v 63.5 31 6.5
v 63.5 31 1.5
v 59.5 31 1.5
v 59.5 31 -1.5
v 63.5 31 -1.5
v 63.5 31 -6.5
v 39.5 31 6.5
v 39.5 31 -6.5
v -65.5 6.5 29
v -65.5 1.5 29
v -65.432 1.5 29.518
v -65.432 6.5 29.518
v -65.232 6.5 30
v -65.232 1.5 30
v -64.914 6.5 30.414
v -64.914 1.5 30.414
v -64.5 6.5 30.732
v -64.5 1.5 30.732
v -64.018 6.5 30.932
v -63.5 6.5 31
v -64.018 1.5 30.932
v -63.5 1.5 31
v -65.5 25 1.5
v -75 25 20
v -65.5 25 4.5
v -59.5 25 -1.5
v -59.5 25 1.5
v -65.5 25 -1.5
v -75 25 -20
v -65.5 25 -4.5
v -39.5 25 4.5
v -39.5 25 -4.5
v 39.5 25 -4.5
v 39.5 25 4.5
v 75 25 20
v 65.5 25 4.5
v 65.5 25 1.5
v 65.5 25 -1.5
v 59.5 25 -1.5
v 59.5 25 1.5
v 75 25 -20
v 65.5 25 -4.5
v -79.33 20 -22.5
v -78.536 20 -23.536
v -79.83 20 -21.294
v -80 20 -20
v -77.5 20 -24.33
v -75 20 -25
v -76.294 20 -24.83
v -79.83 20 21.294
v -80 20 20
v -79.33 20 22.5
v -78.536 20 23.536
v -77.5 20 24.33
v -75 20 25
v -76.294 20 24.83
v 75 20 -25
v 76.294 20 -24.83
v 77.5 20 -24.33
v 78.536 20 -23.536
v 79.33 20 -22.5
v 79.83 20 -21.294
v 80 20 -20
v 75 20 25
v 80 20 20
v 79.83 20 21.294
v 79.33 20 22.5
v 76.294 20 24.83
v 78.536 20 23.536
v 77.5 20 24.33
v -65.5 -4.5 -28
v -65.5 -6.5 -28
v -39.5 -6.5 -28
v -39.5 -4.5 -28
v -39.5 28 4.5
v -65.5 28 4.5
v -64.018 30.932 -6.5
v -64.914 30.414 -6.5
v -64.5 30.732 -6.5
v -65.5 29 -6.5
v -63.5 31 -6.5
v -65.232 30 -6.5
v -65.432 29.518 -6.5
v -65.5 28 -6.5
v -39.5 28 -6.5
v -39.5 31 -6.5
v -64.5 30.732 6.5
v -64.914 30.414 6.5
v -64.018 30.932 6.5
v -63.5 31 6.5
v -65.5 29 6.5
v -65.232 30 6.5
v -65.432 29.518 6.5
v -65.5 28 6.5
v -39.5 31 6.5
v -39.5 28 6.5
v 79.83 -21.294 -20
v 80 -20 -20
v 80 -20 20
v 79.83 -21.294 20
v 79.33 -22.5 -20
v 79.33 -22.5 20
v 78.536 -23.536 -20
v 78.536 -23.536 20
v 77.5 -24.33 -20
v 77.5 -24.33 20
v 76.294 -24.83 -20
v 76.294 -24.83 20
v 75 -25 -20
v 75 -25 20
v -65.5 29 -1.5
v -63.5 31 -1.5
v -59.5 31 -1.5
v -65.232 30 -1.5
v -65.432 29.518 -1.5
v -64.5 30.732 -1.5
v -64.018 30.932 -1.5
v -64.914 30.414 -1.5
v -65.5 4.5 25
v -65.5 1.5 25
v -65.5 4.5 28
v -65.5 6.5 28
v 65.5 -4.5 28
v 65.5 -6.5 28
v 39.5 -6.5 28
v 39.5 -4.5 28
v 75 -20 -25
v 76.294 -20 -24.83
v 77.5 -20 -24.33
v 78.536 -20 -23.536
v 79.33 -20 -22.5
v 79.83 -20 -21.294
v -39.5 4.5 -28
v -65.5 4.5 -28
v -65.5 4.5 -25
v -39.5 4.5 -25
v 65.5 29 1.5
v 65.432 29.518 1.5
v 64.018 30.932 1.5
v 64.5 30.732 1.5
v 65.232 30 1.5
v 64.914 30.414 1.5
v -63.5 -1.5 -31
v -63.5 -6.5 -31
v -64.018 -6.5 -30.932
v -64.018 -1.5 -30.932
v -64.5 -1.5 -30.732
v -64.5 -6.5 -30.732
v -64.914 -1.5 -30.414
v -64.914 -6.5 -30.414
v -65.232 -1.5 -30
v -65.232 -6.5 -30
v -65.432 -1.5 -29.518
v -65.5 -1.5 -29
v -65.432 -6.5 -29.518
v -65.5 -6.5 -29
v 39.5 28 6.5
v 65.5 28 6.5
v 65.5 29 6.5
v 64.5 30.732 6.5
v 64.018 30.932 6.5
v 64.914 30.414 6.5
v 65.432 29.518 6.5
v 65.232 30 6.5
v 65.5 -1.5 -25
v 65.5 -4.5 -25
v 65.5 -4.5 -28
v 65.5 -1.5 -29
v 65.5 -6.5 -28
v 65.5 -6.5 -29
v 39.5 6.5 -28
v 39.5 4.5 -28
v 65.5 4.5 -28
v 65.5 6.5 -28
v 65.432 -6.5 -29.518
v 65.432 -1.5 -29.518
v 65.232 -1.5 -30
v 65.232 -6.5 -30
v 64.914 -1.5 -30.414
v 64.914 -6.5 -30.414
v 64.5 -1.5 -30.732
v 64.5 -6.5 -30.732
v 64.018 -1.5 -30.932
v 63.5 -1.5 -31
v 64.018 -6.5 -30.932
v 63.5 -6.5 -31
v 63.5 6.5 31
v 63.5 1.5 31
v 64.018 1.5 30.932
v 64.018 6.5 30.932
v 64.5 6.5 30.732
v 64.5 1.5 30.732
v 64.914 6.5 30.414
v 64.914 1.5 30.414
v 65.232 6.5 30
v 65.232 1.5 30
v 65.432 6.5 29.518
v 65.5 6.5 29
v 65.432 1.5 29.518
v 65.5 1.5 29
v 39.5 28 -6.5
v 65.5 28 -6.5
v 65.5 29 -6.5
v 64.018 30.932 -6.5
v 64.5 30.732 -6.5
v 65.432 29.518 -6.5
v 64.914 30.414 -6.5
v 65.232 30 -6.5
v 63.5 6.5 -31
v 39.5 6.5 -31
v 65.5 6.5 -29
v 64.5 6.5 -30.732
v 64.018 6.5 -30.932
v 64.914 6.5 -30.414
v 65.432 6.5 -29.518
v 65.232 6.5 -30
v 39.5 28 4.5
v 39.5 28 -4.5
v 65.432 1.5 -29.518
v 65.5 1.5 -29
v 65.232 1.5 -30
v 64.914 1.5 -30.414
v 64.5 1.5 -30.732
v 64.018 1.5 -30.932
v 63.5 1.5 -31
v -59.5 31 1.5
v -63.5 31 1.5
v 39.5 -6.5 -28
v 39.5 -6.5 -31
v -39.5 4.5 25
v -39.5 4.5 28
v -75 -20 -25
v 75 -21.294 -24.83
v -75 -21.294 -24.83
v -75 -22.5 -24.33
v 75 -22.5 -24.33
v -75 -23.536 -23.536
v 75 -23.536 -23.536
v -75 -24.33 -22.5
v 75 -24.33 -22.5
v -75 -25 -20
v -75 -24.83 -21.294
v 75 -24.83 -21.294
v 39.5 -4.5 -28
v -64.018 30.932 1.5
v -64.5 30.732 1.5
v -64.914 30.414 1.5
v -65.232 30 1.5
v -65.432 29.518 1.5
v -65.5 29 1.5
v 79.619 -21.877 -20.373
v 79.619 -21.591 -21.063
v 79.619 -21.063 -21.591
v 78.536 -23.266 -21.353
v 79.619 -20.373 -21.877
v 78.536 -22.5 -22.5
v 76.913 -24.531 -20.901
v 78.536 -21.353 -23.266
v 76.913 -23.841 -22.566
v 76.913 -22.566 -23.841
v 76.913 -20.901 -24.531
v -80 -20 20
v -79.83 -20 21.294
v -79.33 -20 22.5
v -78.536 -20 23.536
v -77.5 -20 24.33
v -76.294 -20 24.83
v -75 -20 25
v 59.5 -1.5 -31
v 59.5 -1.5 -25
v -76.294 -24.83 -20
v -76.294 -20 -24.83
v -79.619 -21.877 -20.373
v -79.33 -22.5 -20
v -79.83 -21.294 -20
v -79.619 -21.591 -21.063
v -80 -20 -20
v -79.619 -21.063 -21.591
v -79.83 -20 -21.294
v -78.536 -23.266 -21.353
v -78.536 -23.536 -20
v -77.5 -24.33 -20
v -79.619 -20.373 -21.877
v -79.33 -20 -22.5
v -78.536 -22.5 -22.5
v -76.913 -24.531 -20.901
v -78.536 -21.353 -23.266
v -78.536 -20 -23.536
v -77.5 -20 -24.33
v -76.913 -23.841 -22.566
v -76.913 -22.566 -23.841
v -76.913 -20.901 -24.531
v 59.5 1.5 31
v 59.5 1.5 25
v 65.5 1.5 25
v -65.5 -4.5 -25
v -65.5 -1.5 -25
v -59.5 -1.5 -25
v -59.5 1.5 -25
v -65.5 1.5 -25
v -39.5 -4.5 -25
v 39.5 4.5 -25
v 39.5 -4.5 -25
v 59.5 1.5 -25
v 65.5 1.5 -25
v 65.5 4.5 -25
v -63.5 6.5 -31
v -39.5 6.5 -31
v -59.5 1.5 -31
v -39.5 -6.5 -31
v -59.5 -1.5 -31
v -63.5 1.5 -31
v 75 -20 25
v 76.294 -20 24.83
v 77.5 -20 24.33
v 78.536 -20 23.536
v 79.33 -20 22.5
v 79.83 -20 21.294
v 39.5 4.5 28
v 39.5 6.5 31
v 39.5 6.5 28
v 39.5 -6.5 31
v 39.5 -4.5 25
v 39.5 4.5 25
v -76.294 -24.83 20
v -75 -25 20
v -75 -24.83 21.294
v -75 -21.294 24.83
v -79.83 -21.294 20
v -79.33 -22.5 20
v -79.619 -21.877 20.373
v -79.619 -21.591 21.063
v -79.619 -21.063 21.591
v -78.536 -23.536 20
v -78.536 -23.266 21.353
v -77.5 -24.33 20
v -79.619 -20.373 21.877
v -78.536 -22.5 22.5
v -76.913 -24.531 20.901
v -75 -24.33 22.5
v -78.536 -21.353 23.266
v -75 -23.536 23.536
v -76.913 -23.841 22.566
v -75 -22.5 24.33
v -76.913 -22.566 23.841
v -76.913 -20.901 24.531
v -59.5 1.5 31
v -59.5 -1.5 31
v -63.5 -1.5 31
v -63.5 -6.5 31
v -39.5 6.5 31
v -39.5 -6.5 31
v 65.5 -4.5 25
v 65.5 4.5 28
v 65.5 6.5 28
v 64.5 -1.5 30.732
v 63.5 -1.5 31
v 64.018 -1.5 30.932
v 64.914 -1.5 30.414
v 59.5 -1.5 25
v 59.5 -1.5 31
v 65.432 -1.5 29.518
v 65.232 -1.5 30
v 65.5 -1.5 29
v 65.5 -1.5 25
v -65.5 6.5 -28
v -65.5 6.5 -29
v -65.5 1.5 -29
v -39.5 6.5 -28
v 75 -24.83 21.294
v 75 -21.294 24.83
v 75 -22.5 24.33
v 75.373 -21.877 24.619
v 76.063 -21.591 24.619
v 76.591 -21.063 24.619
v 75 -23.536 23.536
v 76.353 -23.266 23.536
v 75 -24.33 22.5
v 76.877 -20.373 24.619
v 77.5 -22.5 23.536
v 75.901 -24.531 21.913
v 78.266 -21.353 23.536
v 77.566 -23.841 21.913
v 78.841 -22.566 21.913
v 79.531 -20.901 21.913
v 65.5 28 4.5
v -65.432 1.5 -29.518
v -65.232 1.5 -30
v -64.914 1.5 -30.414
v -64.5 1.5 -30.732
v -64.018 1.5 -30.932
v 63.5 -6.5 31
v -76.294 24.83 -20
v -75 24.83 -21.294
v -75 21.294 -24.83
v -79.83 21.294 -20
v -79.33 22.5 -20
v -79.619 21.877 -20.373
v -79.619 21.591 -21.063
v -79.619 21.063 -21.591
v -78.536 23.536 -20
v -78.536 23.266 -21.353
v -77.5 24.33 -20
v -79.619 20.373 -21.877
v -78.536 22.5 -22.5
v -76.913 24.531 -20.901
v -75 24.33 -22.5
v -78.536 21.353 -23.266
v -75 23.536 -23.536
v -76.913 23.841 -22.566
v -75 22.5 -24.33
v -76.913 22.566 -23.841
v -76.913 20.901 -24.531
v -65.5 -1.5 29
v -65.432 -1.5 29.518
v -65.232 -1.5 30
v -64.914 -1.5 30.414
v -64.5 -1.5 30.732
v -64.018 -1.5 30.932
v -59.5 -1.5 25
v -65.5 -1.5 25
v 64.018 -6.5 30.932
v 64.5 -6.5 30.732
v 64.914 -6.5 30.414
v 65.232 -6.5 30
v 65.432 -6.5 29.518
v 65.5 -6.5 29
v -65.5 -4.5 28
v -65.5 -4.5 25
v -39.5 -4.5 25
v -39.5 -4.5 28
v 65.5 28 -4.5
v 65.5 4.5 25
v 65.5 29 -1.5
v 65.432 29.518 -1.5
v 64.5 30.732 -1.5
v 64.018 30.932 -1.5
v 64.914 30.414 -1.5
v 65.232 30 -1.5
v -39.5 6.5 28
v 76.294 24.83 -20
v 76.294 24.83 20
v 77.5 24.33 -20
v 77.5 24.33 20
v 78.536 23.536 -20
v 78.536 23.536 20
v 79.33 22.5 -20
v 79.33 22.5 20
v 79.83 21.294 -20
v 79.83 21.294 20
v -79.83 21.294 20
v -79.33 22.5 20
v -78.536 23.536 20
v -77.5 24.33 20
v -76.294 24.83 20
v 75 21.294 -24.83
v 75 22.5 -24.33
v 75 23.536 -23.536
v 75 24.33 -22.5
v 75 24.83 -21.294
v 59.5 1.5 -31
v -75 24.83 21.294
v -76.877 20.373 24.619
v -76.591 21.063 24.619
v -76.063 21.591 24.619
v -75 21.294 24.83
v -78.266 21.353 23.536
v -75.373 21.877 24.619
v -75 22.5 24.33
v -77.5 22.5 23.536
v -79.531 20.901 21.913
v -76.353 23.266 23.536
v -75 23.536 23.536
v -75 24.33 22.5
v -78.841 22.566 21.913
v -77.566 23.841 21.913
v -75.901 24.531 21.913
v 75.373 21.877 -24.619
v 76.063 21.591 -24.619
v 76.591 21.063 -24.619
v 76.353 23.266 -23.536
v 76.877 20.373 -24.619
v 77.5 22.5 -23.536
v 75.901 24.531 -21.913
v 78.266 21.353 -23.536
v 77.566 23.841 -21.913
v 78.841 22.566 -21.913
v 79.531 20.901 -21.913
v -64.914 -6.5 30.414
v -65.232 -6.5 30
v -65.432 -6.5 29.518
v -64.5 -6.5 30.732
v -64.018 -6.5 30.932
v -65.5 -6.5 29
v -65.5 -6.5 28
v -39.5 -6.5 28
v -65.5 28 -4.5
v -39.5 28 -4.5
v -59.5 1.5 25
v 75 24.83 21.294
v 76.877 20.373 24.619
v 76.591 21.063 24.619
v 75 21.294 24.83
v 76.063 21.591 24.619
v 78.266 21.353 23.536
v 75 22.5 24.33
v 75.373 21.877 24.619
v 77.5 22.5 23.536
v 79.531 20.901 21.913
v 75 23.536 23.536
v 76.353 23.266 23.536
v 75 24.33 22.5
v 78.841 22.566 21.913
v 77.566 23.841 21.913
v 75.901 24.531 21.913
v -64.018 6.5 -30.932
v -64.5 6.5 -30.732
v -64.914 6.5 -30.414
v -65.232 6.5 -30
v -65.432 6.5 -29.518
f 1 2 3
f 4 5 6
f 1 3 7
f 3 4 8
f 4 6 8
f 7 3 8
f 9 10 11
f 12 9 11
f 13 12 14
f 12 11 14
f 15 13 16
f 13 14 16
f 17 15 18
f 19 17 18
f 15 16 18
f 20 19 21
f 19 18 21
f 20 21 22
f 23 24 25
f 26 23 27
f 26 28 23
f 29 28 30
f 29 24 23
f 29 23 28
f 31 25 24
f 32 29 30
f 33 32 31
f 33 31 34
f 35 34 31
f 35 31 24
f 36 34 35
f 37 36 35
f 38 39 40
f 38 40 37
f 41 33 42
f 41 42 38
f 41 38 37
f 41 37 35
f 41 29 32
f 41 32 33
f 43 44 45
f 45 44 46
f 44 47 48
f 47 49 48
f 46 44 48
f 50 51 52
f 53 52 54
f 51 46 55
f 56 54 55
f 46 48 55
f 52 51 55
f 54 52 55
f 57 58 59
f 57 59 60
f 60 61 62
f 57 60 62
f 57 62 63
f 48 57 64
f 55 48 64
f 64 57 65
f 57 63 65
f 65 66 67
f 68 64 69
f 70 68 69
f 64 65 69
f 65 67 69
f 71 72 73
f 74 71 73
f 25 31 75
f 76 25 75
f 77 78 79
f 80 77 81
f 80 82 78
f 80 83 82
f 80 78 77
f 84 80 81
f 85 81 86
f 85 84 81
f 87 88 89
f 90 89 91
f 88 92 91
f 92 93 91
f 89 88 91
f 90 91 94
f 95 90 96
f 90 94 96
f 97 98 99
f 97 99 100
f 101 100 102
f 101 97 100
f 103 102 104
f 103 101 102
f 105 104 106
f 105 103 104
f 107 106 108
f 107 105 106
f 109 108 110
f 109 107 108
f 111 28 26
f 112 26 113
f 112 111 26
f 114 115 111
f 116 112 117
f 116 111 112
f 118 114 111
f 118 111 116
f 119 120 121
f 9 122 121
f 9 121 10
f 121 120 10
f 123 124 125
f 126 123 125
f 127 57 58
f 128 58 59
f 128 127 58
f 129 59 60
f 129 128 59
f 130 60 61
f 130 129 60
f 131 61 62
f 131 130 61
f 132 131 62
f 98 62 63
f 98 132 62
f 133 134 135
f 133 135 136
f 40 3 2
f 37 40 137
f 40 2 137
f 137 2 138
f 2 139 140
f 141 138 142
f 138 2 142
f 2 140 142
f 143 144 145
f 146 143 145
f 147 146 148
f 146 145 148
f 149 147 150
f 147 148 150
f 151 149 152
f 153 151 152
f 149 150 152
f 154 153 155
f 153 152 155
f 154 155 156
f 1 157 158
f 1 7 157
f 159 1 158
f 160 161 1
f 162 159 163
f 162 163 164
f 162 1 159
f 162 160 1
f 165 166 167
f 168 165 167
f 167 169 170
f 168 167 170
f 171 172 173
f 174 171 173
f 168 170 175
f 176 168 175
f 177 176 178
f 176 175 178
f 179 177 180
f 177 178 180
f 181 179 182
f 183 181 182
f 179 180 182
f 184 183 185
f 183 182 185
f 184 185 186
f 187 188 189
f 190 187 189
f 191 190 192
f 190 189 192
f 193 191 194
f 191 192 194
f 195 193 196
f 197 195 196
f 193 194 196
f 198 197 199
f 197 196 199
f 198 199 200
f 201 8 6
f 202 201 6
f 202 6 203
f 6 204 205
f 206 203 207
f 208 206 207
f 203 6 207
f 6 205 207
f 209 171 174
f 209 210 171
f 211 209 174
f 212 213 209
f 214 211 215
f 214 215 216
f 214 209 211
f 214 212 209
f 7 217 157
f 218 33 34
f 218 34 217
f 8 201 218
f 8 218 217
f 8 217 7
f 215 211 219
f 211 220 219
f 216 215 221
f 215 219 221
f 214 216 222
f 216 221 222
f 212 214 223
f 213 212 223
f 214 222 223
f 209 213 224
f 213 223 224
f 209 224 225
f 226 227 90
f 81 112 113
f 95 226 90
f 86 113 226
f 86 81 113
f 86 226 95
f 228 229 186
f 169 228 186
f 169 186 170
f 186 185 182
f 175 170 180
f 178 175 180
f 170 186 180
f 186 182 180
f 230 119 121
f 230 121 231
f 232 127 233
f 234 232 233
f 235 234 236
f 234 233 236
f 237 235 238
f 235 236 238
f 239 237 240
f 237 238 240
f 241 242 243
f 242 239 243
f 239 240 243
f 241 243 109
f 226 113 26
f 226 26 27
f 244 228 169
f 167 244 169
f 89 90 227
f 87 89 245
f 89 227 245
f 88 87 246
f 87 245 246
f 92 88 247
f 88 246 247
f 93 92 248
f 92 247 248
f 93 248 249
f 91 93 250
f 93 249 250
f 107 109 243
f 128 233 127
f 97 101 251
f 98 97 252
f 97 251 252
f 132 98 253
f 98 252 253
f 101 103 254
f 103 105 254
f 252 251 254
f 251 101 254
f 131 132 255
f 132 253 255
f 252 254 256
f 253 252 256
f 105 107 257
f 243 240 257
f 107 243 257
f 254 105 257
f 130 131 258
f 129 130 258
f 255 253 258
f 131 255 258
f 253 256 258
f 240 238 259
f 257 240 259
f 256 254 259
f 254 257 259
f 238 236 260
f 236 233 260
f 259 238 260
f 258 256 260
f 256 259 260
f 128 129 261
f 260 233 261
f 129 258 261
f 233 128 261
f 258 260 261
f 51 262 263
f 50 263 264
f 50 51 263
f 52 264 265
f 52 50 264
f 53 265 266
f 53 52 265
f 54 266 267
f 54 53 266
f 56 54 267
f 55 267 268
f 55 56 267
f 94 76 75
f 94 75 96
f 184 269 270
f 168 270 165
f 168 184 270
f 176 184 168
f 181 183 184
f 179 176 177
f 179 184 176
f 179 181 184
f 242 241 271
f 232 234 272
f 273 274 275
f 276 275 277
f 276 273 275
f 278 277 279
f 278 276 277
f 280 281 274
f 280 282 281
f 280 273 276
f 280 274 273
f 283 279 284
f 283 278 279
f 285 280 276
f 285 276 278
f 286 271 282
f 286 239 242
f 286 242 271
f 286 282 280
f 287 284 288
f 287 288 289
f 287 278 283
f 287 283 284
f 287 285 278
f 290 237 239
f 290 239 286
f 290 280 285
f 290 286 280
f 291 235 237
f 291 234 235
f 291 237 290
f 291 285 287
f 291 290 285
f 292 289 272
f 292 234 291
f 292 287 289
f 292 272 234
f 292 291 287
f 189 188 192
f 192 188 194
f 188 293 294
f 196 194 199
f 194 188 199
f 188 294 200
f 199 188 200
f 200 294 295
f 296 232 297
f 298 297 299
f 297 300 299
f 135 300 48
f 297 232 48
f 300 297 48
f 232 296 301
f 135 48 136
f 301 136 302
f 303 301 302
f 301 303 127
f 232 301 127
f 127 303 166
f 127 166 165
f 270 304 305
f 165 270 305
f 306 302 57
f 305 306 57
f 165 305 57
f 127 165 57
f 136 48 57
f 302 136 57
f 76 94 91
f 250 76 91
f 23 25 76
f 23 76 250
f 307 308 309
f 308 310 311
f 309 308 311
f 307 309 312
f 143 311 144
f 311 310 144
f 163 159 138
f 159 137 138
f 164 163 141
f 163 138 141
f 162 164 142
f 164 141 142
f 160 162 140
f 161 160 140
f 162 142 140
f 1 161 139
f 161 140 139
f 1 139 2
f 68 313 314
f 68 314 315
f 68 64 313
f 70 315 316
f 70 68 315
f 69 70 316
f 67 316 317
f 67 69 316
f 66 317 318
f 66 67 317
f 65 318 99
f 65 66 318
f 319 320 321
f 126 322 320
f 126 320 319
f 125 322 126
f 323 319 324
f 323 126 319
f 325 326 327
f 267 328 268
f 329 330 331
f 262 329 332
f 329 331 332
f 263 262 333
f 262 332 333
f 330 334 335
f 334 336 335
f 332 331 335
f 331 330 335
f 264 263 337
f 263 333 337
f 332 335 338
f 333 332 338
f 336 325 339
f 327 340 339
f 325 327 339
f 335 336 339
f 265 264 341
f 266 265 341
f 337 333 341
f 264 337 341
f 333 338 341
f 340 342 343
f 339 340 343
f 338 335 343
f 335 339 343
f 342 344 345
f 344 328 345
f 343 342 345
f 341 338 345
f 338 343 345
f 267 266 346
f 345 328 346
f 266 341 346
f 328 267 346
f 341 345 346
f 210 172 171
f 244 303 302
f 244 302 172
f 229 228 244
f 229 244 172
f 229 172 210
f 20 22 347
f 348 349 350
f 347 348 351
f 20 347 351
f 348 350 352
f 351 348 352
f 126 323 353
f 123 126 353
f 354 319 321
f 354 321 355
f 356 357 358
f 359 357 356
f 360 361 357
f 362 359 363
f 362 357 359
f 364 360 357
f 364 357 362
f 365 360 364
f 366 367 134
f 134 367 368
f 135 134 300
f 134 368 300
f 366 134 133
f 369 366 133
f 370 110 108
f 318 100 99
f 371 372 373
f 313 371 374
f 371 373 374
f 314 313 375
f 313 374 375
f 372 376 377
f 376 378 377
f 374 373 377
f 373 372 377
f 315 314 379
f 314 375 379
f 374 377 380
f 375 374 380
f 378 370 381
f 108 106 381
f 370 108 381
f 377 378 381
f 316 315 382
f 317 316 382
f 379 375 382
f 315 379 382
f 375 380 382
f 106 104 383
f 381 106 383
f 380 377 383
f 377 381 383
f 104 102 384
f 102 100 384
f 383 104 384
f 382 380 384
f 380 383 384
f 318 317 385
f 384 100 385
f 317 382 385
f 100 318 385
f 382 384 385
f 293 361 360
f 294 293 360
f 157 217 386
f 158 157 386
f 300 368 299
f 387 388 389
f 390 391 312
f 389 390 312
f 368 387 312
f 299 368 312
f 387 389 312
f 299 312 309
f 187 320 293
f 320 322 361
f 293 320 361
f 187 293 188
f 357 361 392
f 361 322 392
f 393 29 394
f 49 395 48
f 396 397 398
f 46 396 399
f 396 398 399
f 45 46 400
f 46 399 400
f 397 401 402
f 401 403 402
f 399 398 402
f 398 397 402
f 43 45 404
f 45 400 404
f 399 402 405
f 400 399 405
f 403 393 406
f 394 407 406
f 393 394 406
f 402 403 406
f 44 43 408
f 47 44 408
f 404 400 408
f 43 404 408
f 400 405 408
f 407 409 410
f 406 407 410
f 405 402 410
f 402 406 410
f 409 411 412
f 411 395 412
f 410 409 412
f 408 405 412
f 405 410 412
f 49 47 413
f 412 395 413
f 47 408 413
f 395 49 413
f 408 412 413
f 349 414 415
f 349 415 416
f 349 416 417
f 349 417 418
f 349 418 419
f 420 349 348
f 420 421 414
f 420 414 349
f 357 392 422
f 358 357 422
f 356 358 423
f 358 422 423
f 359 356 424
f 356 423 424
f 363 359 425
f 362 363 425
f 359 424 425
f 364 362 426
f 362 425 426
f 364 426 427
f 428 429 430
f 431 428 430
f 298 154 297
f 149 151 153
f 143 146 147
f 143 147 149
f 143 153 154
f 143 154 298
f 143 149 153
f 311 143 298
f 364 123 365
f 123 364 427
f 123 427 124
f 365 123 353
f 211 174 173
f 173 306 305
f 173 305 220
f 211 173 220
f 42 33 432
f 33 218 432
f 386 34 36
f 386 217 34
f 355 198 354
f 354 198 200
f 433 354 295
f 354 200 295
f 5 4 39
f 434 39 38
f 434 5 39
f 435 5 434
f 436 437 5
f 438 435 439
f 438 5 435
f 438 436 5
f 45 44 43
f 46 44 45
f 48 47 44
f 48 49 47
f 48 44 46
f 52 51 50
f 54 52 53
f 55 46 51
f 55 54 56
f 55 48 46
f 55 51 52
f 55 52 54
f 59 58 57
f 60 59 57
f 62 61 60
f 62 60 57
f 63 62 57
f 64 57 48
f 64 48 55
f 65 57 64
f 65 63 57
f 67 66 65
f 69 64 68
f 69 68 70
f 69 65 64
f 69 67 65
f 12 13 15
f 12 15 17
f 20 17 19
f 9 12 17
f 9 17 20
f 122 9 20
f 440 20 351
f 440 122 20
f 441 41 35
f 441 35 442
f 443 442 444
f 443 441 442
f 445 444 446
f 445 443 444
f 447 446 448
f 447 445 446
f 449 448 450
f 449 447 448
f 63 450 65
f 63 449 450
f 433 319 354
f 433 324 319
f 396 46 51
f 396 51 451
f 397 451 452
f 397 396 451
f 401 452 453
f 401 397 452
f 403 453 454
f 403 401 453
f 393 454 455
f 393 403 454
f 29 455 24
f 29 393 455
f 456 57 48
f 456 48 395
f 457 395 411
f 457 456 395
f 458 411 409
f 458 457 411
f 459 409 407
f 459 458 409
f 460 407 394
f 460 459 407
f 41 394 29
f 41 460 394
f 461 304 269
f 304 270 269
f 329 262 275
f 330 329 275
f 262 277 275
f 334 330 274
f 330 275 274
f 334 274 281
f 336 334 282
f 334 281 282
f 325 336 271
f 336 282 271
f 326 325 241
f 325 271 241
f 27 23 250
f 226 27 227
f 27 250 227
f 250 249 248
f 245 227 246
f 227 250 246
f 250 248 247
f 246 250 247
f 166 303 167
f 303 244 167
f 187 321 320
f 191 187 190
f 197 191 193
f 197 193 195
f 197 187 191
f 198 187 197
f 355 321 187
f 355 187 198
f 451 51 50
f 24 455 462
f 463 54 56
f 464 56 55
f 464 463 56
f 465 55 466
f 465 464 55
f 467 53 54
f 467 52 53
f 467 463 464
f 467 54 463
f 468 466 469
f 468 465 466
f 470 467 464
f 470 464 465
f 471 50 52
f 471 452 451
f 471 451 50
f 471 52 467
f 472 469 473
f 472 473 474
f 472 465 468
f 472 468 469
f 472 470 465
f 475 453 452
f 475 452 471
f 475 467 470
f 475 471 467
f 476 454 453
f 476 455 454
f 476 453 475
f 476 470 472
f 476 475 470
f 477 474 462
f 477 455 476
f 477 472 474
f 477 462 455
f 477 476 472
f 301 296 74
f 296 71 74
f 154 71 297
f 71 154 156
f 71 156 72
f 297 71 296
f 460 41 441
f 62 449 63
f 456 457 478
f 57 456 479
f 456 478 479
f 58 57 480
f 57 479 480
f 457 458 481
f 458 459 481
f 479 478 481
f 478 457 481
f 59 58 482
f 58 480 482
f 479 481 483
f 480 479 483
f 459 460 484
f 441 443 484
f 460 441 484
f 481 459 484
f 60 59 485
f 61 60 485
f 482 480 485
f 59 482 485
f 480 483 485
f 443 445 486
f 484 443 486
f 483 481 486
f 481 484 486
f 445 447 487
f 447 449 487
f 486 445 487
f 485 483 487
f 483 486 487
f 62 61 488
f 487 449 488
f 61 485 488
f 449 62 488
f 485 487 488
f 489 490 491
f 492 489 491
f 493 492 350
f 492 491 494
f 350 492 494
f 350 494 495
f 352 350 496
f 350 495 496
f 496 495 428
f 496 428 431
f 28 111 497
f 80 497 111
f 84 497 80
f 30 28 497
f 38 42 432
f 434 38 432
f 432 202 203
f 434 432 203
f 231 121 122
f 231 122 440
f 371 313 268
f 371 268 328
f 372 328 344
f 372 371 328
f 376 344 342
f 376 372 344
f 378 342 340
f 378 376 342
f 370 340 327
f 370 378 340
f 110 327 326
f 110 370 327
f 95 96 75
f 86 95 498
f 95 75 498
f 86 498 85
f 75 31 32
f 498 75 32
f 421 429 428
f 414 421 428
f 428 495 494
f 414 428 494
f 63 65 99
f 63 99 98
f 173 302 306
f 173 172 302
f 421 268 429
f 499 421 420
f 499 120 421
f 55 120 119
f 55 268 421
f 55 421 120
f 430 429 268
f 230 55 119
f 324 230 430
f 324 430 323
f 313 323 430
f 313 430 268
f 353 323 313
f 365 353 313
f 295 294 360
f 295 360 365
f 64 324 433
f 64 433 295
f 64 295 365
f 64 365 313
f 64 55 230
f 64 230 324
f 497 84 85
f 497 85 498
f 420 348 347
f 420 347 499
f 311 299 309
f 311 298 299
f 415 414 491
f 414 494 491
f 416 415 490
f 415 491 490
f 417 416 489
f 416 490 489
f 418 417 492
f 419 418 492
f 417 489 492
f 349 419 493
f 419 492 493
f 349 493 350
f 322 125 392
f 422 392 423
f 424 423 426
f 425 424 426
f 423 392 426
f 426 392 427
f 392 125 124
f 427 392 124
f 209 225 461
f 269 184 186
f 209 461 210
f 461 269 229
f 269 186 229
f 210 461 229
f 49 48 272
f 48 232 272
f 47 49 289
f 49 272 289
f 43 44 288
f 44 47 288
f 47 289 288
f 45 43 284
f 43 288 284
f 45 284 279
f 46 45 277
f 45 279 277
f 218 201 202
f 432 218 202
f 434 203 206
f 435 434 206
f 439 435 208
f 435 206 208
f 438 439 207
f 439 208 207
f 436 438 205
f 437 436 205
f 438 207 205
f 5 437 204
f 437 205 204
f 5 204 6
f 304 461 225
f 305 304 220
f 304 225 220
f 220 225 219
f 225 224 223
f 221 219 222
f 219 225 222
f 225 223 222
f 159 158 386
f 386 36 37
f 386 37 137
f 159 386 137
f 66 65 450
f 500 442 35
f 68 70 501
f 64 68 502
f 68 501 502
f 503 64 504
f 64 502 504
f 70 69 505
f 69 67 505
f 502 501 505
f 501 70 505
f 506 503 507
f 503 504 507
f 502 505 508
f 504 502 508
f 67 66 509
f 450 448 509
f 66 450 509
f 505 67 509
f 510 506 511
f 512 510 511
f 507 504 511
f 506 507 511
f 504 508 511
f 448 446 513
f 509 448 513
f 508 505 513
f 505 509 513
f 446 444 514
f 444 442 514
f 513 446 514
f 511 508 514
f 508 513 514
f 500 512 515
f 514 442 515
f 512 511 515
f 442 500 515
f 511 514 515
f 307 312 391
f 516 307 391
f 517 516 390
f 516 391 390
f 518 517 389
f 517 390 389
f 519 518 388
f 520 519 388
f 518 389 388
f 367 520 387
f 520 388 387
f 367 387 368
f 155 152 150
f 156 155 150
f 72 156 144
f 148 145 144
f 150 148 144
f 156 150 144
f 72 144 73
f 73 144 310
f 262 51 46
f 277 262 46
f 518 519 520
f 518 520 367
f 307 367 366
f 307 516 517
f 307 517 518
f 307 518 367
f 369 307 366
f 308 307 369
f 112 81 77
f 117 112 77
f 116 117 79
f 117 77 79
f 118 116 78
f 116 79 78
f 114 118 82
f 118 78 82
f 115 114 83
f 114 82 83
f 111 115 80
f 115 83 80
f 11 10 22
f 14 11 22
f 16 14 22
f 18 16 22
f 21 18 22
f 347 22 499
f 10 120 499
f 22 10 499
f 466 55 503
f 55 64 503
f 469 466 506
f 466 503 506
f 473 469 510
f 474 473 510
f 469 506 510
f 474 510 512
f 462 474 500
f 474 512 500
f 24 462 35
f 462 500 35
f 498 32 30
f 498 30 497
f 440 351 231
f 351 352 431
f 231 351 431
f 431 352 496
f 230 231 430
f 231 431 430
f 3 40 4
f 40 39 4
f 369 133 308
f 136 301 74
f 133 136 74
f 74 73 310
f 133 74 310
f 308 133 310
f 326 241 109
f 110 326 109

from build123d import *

# Parameters (mm, degrees)
SKETCH1_W               = 160
SKETCH1_H               = 50
BOSS_EXTRUDE1_DEPTH     = 25
SKETCH2_W               = 26
SKETCH2_H               = 13
CONNECTOR_BASE_DEPTH    = 6
SKETCH3_W               = 2
SKETCH3_H               = 3
DOVETAIL_CUT_DEPTH      = 151.851748415
FILLET1_R               = 2
SKETCH4_W               = 3
SKETCH4_H               = 6
CUT_EXTRUDE1_DEPTH      = 6
CIRPATTERN1_START       = -4.5
CIRPATTERN1_OUTLINE_W   = 20
CIRPATTERN1_OUTLINE_H   = 6
CIRPATTERN1_DEPTH       = 9
CIRPATTERN1_START_2     = -6.5
CIRPATTERN1_2_OUTLINE_W = 20
CIRPATTERN1_2_OUTLINE_H = 3
CIRPATTERN1_2_DEPTH     = 13
CIRPATTERN1_3_DEPTH     = 3
CIRPATTERN1_START_3     = 1.5
CIRPATTERN1_4_DEPTH     = 3
CIRPATTERN1_5_DEPTH     = 2
CIRPATTERN1_START_4     = 4.5
CIRPATTERN1_6_DEPTH     = 2
CIRPATTERN1_7_OUTLINE_W = 20
CIRPATTERN1_7_OUTLINE_H = 6
CIRPATTERN1_7_DEPTH     = 9
CIRPATTERN1_8_OUTLINE_W = 20
CIRPATTERN1_8_OUTLINE_H = 3
CIRPATTERN1_8_DEPTH     = 13
CIRPATTERN1_9_DEPTH     = 3
CIRPATTERN1_10_DEPTH    = 3
CIRPATTERN1_11_DEPTH    = 2
CIRPATTERN1_12_DEPTH    = 2
MIRROR1_START           = -4.5
MIRROR1_OUTLINE_W       = 20
MIRROR1_OUTLINE_H       = 6
MIRROR1_DEPTH           = 9
MIRROR1_START_2         = -6.5
MIRROR1_2_OUTLINE_W     = 20
MIRROR1_2_OUTLINE_H     = 3
MIRROR1_2_DEPTH         = 13
MIRROR1_3_DEPTH         = 3
MIRROR1_START_3         = 1.5
MIRROR1_4_DEPTH         = 3
MIRROR1_5_DEPTH         = 2
MIRROR1_START_4         = 4.5
MIRROR1_6_DEPTH         = 2
MIRROR1_7_OUTLINE_W     = 20
MIRROR1_7_OUTLINE_H     = 6
MIRROR1_7_DEPTH         = 9
MIRROR1_8_OUTLINE_W     = 20
MIRROR1_8_OUTLINE_H     = 3
MIRROR1_8_DEPTH         = 13
MIRROR1_9_DEPTH         = 3
MIRROR1_10_DEPTH        = 3
MIRROR1_11_DEPTH        = 2
MIRROR1_12_DEPTH        = 2
FILLET2_R               = 5
SKETCH5_W               = 150
SKETCH5_H               = 40
CUT_EXTRUDE2_DEPTH      = 6


# Read off the part's stored shape, not the designer's step: CirPattern1, Mirror1
with BuildPart() as part:
    # Sketch1 → Boss-Extrude1 (new, symmetric)
    with BuildSketch(Plane(origin=(0, 0, 0), x_dir=(1, 0, 0), z_dir=(0, 1, 0))):
        Rectangle(SKETCH1_W, SKETCH1_H)
    extrude(amount=BOSS_EXTRUDE1_DEPTH, both=True)

    # Sketch2 → connector base (add)
    with BuildSketch(Plane(origin=(0, 25, 0), x_dir=(1, 0, 0), z_dir=(0, 1, 0))):
        with Locations((-52.5, 0)):
            Rectangle(SKETCH2_W, SKETCH2_H)
    extrude(amount=CONNECTOR_BASE_DEPTH)

    # Sketch3 → dovetail cut (cut, through all)
    with BuildSketch(Plane.ZY.offset(65.5)):
        with Locations((5.5, 26.5)):
            Rectangle(SKETCH3_W, SKETCH3_H)
        with Locations((-5.5, 26.5)):
            Rectangle(SKETCH3_W, SKETCH3_H)
    extrude(amount=-DOVETAIL_CUT_DEPTH, mode=Mode.SUBTRACT)

    # Fillet1
    fillet1_edges = [part.edges().sort_by_distance(p)[0] for p in [
        (-65.5, 31, 0),
    ]]
    fillet(fillet1_edges, radius=FILLET1_R)

    # Sketch4 → Cut-Extrude1 (cut)
    with BuildSketch(Plane.ZY.offset(65.5)):
        with Locations((0, 28)):
            Rectangle(SKETCH4_W, SKETCH4_H)
    extrude(amount=-CUT_EXTRUDE1_DEPTH, mode=Mode.SUBTRACT)

    # CirPattern1 outline → CirPattern1 (add)
    with BuildSketch(Plane(origin=(0, 0, 0), x_dir=(1, 0, 0), z_dir=(0, 1, 0)).offset(CIRPATTERN1_START)):
        with Locations((-49.5, 28)):
            Rectangle(CIRPATTERN1_OUTLINE_W, CIRPATTERN1_OUTLINE_H)
        with Locations((-49.5, -28)):
            Rectangle(CIRPATTERN1_OUTLINE_W, CIRPATTERN1_OUTLINE_H)
    extrude(amount=CIRPATTERN1_DEPTH)

    # CirPattern1 2 outline → CirPattern1 2 (add)
    with BuildSketch(Plane(origin=(0, 0, 0), x_dir=(1, 0, 0), z_dir=(0, 1, 0)).offset(CIRPATTERN1_START_2)):
        with Locations((-49.5, 29.5)):
            Rectangle(CIRPATTERN1_2_OUTLINE_W, CIRPATTERN1_2_OUTLINE_H)
        with Locations((-49.5, -29.5)):
            Rectangle(CIRPATTERN1_2_OUTLINE_W, CIRPATTERN1_2_OUTLINE_H)
    extrude(amount=CIRPATTERN1_2_DEPTH)

    # CirPattern1 3 outline → CirPattern1 3 (add)
    with BuildSketch(Plane(origin=(0, 0, 0), x_dir=(1, 0, 0), z_dir=(0, 1, 0)).offset(CIRPATTERN1_START)):
        with BuildLine():
            Line((-65.5, 25), (-59.5, 25))
            Line((-59.5, 25), (-59.5, 31))
            Line((-59.5, 31), (-63.5, 31))
            ThreePointArc((-63.5, 31), (-64.914213562, 30.414213562), (-65.5, 29))
            Line((-65.5, 29), (-65.5, 25))
        make_face()
        with BuildLine():
            ThreePointArc((-65.5, -29), (-64.914213562, -30.414213562), (-63.5, -31))
            Line((-63.5, -31), (-59.5, -31))
            Line((-59.5, -31), (-59.5, -25))
            Line((-59.5, -25), (-65.5, -25))
            Line((-65.5, -25), (-65.5, -29))
        make_face()
    extrude(amount=CIRPATTERN1_3_DEPTH)

    # CirPattern1 4 outline → CirPattern1 4 (add)
    with BuildSketch(Plane(origin=(0, 0, 0), x_dir=(1, 0, 0), z_dir=(0, 1, 0)).offset(CIRPATTERN1_START_3)):
        with BuildLine():
            Line((-65.5, 25), (-59.5, 25))
            Line((-59.5, 25), (-59.5, 31))
            Line((-59.5, 31), (-63.5, 31))
            ThreePointArc((-63.5, 31), (-64.914213562, 30.414213562), (-65.5, 29))
            Line((-65.5, 29), (-65.5, 25))
        make_face()
        with BuildLine():
            ThreePointArc((-65.5, -29), (-64.914213562, -30.414213562), (-63.5, -31))
            Line((-63.5, -31), (-59.5, -31))
            Line((-59.5, -31), (-59.5, -25))
            Line((-59.5, -25), (-65.5, -25))
            Line((-65.5, -25), (-65.5, -29))
        make_face()
    extrude(amount=CIRPATTERN1_4_DEPTH)

    # CirPattern1 5 outline → CirPattern1 5 (add)
    with BuildSketch(Plane(origin=(0, 0, 0), x_dir=(1, 0, 0), z_dir=(0, 1, 0)).offset(CIRPATTERN1_START_2)):
        with BuildLine():
            Line((-65.5, 29), (-65.5, 28))
            Line((-65.5, 28), (-59.5, 28))
            Line((-59.5, 28), (-59.5, 31))
            Line((-59.5, 31), (-63.5, 31))
            ThreePointArc((-63.5, 31), (-64.914213562, 30.414213562), (-65.5, 29))
        make_face()
        with BuildLine():
            Line((-65.5, -28), (-65.5, -29))
            ThreePointArc((-65.5, -29), (-64.914213562, -30.414213562), (-63.5, -31))
            Line((-63.5, -31), (-59.5, -31))
            Line((-59.5, -31), (-59.5, -28))
            Line((-59.5, -28), (-65.5, -28))
        make_face()
    extrude(amount=CIRPATTERN1_5_DEPTH)

    # CirPattern1 6 outline → CirPattern1 6 (add)
    with BuildSketch(Plane(origin=(0, 0, 0), x_dir=(1, 0, 0), z_dir=(0, 1, 0)).offset(CIRPATTERN1_START_4)):
        with BuildLine():
            Line((-65.5, 29), (-65.5, 28))
            Line((-65.5, 28), (-59.5, 28))
            Line((-59.5, 28), (-59.5, 31))
            Line((-59.5, 31), (-63.5, 31))
            ThreePointArc((-63.5, 31), (-64.914213562, 30.414213562), (-65.5, 29))
        make_face()
        with BuildLine():
            Line((-65.5, -28), (-65.5, -29))
            ThreePointArc((-65.5, -29), (-64.914213562, -30.414213562), (-63.5, -31))
            Line((-63.5, -31), (-59.5, -31))
            Line((-59.5, -31), (-59.5, -28))
            Line((-59.5, -28), (-65.5, -28))
        make_face()
    extrude(amount=CIRPATTERN1_6_DEPTH)

    # CirPattern1 7 outline → CirPattern1 7 (add)
    with BuildSketch(Plane.XY.offset(CIRPATTERN1_START)):
        with Locations((-49.5, -28)):
            Rectangle(CIRPATTERN1_7_OUTLINE_W, CIRPATTERN1_7_OUTLINE_H)
    extrude(amount=CIRPATTERN1_7_DEPTH)

    # CirPattern1 8 outline → CirPattern1 8 (add)
    with BuildSketch(Plane.XY.offset(CIRPATTERN1_START_2)):
        with Locations((-49.5, -29.5)):
            Rectangle(CIRPATTERN1_8_OUTLINE_W, CIRPATTERN1_8_OUTLINE_H)
    extrude(amount=CIRPATTERN1_8_DEPTH)

    # CirPattern1 9 outline → CirPattern1 9 (add)
    with BuildSketch(Plane.XY.offset(CIRPATTERN1_START)):
        with BuildLine():
            ThreePointArc((-65.5, -29), (-64.914213562, -30.414213562), (-63.5, -31))
            Line((-63.5, -31), (-59.5, -31))
            Line((-59.5, -31), (-59.5, -25))
            Line((-59.5, -25), (-65.5, -25))
            Line((-65.5, -25), (-65.5, -29))
        make_face()
    extrude(amount=CIRPATTERN1_9_DEPTH)

    # CirPattern1 10 outline → CirPattern1 10 (add)
    with BuildSketch(Plane.XY.offset(CIRPATTERN1_START_3)):
        with BuildLine():
            ThreePointArc((-65.5, -29), (-64.914213562, -30.414213562), (-63.5, -31))
            Line((-63.5, -31), (-59.5, -31))
            Line((-59.5, -31), (-59.5, -25))
            Line((-59.5, -25), (-65.5, -25))
            Line((-65.5, -25), (-65.5, -29))
        make_face()
    extrude(amount=CIRPATTERN1_10_DEPTH)

    # CirPattern1 11 outline → CirPattern1 11 (add)
    with BuildSketch(Plane.XY.offset(CIRPATTERN1_START_2)):
        with BuildLine():
            Line((-65.5, -28), (-65.5, -29))
            ThreePointArc((-65.5, -29), (-64.914213562, -30.414213562), (-63.5, -31))
            Line((-63.5, -31), (-59.5, -31))
            Line((-59.5, -31), (-59.5, -28))
            Line((-59.5, -28), (-65.5, -28))
        make_face()
    extrude(amount=CIRPATTERN1_11_DEPTH)

    # CirPattern1 12 outline → CirPattern1 12 (add)
    with BuildSketch(Plane.XY.offset(CIRPATTERN1_START_4)):
        with BuildLine():
            Line((-65.5, -28), (-65.5, -29))
            ThreePointArc((-65.5, -29), (-64.914213562, -30.414213562), (-63.5, -31))
            Line((-63.5, -31), (-59.5, -31))
            Line((-59.5, -31), (-59.5, -28))
            Line((-59.5, -28), (-65.5, -28))
        make_face()
    extrude(amount=CIRPATTERN1_12_DEPTH)

    # Mirror1 outline → Mirror1 (add)
    with BuildSketch(Plane.XY.offset(MIRROR1_START)):
        with Locations((49.5, 28)):
            Rectangle(MIRROR1_OUTLINE_W, MIRROR1_OUTLINE_H)
        with Locations((49.5, -28)):
            Rectangle(MIRROR1_OUTLINE_W, MIRROR1_OUTLINE_H)
    extrude(amount=MIRROR1_DEPTH)

    # Mirror1 2 outline → Mirror1 2 (add)
    with BuildSketch(Plane.XY.offset(MIRROR1_START_2)):
        with Locations((49.5, 29.5)):
            Rectangle(MIRROR1_2_OUTLINE_W, MIRROR1_2_OUTLINE_H)
        with Locations((49.5, -29.5)):
            Rectangle(MIRROR1_2_OUTLINE_W, MIRROR1_2_OUTLINE_H)
    extrude(amount=MIRROR1_2_DEPTH)

    # Mirror1 3 outline → Mirror1 3 (add)
    with BuildSketch(Plane.XY.offset(MIRROR1_START)):
        with BuildLine():
            Line((59.5, 25), (65.5, 25))
            Line((65.5, 25), (65.5, 29))
            ThreePointArc((65.5, 29), (64.914213562, 30.414213562), (63.5, 31))
            Line((63.5, 31), (59.5, 31))
            Line((59.5, 31), (59.5, 25))
        make_face()
        with BuildLine():
            ThreePointArc((63.5, -31), (64.914213562, -30.414213562), (65.5, -29))
            Line((65.5, -29), (65.5, -25))
            Line((65.5, -25), (59.5, -25))
            Line((59.5, -25), (59.5, -31))
            Line((59.5, -31), (63.5, -31))
        make_face()
    extrude(amount=MIRROR1_3_DEPTH)

    # Mirror1 4 outline → Mirror1 4 (add)
    with BuildSketch(Plane.XY.offset(MIRROR1_START_3)):
        with BuildLine():
            Line((59.5, 25), (65.5, 25))
            Line((65.5, 25), (65.5, 29))
            ThreePointArc((65.5, 29), (64.914213562, 30.414213562), (63.5, 31))
            Line((63.5, 31), (59.5, 31))
            Line((59.5, 31), (59.5, 25))
        make_face()
        with BuildLine():
            ThreePointArc((63.5, -31), (64.914213562, -30.414213562), (65.5, -29))
            Line((65.5, -29), (65.5, -25))
            Line((65.5, -25), (59.5, -25))
            Line((59.5, -25), (59.5, -31))
            Line((59.5, -31), (63.5, -31))
        make_face()
    extrude(amount=MIRROR1_4_DEPTH)

    # Mirror1 5 outline → Mirror1 5 (add)
    with BuildSketch(Plane.XY.offset(MIRROR1_START_2)):
        with BuildLine():
            Line((59.5, 28), (65.5, 28))
            Line((65.5, 28), (65.5, 29))
            ThreePointArc((65.5, 29), (64.914213562, 30.414213562), (63.5, 31))
            Line((63.5, 31), (59.5, 31))
            Line((59.5, 31), (59.5, 28))
        make_face()
        with BuildLine():
            ThreePointArc((63.5, -31), (64.914213562, -30.414213562), (65.5, -29))
            Line((65.5, -29), (65.5, -28))
            Line((65.5, -28), (59.5, -28))
            Line((59.5, -28), (59.5, -31))
            Line((59.5, -31), (63.5, -31))
        make_face()
    extrude(amount=MIRROR1_5_DEPTH)

    # Mirror1 6 outline → Mirror1 6 (add)
    with BuildSketch(Plane.XY.offset(MIRROR1_START_4)):
        with BuildLine():
            Line((59.5, 28), (65.5, 28))
            Line((65.5, 28), (65.5, 29))
            ThreePointArc((65.5, 29), (64.914213562, 30.414213562), (63.5, 31))
            Line((63.5, 31), (59.5, 31))
            Line((59.5, 31), (59.5, 28))
        make_face()
        with BuildLine():
            ThreePointArc((63.5, -31), (64.914213562, -30.414213562), (65.5, -29))
            Line((65.5, -29), (65.5, -28))
            Line((65.5, -28), (59.5, -28))
            Line((59.5, -28), (59.5, -31))
            Line((59.5, -31), (63.5, -31))
        make_face()
    extrude(amount=MIRROR1_6_DEPTH)

    # Mirror1 7 outline → Mirror1 7 (add)
    with BuildSketch(Plane(origin=(0, 0, 0), x_dir=(1, 0, 0), z_dir=(0, 1, 0)).offset(MIRROR1_START)):
        with Locations((49.5, 28)):
            Rectangle(MIRROR1_7_OUTLINE_W, MIRROR1_7_OUTLINE_H)
        with Locations((49.5, -28)):
            Rectangle(MIRROR1_7_OUTLINE_W, MIRROR1_7_OUTLINE_H)
    extrude(amount=MIRROR1_7_DEPTH)

    # Mirror1 8 outline → Mirror1 8 (add)
    with BuildSketch(Plane(origin=(0, 0, 0), x_dir=(1, 0, 0), z_dir=(0, 1, 0)).offset(MIRROR1_START_2)):
        with Locations((49.5, 29.5)):
            Rectangle(MIRROR1_8_OUTLINE_W, MIRROR1_8_OUTLINE_H)
        with Locations((49.5, -29.5)):
            Rectangle(MIRROR1_8_OUTLINE_W, MIRROR1_8_OUTLINE_H)
    extrude(amount=MIRROR1_8_DEPTH)

    # Mirror1 9 outline → Mirror1 9 (add)
    with BuildSketch(Plane(origin=(0, 0, 0), x_dir=(1, 0, 0), z_dir=(0, 1, 0)).offset(MIRROR1_START)):
        with BuildLine():
            Line((59.5, 25), (65.5, 25))
            Line((65.5, 25), (65.5, 29))
            ThreePointArc((65.5, 29), (64.914213562, 30.414213562), (63.5, 31))
            Line((63.5, 31), (59.5, 31))
            Line((59.5, 31), (59.5, 25))
        make_face()
        with BuildLine():
            ThreePointArc((63.5, -31), (64.914213562, -30.414213562), (65.5, -29))
            Line((65.5, -29), (65.5, -25))
            Line((65.5, -25), (59.5, -25))
            Line((59.5, -25), (59.5, -31))
            Line((59.5, -31), (63.5, -31))
        make_face()
    extrude(amount=MIRROR1_9_DEPTH)

    # Mirror1 10 outline → Mirror1 10 (add)
    with BuildSketch(Plane(origin=(0, 0, 0), x_dir=(1, 0, 0), z_dir=(0, 1, 0)).offset(MIRROR1_START_3)):
        with BuildLine():
            Line((59.5, 25), (65.5, 25))
            Line((65.5, 25), (65.5, 29))
            ThreePointArc((65.5, 29), (64.914213562, 30.414213562), (63.5, 31))
            Line((63.5, 31), (59.5, 31))
            Line((59.5, 31), (59.5, 25))
        make_face()
        with BuildLine():
            ThreePointArc((63.5, -31), (64.914213562, -30.414213562), (65.5, -29))
            Line((65.5, -29), (65.5, -25))
            Line((65.5, -25), (59.5, -25))
            Line((59.5, -25), (59.5, -31))
            Line((59.5, -31), (63.5, -31))
        make_face()
    extrude(amount=MIRROR1_10_DEPTH)

    # Mirror1 11 outline → Mirror1 11 (add)
    with BuildSketch(Plane(origin=(0, 0, 0), x_dir=(1, 0, 0), z_dir=(0, 1, 0)).offset(MIRROR1_START_2)):
        with BuildLine():
            Line((59.5, 28), (65.5, 28))
            Line((65.5, 28), (65.5, 29))
            ThreePointArc((65.5, 29), (64.914213562, 30.414213562), (63.5, 31))
            Line((63.5, 31), (59.5, 31))
            Line((59.5, 31), (59.5, 28))
        make_face()
        with BuildLine():
            ThreePointArc((63.5, -31), (64.914213562, -30.414213562), (65.5, -29))
            Line((65.5, -29), (65.5, -28))
            Line((65.5, -28), (59.5, -28))
            Line((59.5, -28), (59.5, -31))
            Line((59.5, -31), (63.5, -31))
        make_face()
    extrude(amount=MIRROR1_11_DEPTH)

    # Mirror1 12 outline → Mirror1 12 (add)
    with BuildSketch(Plane(origin=(0, 0, 0), x_dir=(1, 0, 0), z_dir=(0, 1, 0)).offset(MIRROR1_START_4)):
        with BuildLine():
            Line((59.5, 28), (65.5, 28))
            Line((65.5, 28), (65.5, 29))
            ThreePointArc((65.5, 29), (64.914213562, 30.414213562), (63.5, 31))
            Line((63.5, 31), (59.5, 31))
            Line((59.5, 31), (59.5, 28))
        make_face()
        with BuildLine():
            ThreePointArc((63.5, -31), (64.914213562, -30.414213562), (65.5, -29))
            Line((65.5, -29), (65.5, -28))
            Line((65.5, -28), (59.5, -28))
            Line((59.5, -28), (59.5, -31))
            Line((59.5, -31), (63.5, -31))
        make_face()
    extrude(amount=MIRROR1_12_DEPTH)

    # Fillet2
    fillet2_edges = [part.edges().sort_by_distance(p)[0] for p in [
        (80, 25, 0),
        (0, 25, -25),
        (-80, 25, 0),
        (0, -25, -25),
        (80, -25, 0),
        (0, -25, 25),
        (-80, -25, 0),
        (-80, 0, -25),
        (80, 0, -25),
        (80, 0, 25),
        (-80, 0, 25),
        (0, 25, 25),
    ]]
    fillet(fillet2_edges, radius=FILLET2_R)

    # Sketch5 → Cut-Extrude2 (cut)
    with BuildSketch(Plane(origin=(0, -31, 0), x_dir=(-1, 0, 0), z_dir=(0, -1, 0))):
        Rectangle(SKETCH5_W, SKETCH5_H)
    extrude(amount=-CUT_EXTRUDE2_DEPTH, mode=Mode.SUBTRACT)


with BuildPart() as body_2:
    # Split1: the piece on the far side of the plane
    add(part.part)
    split(bisect_by=Plane.ZX.offset(20), keep=Keep.BOTTOM)


with BuildPart() as part_1:
    add(part.part)

    # Split1
    split(bisect_by=Plane.ZX.offset(20), keep=Keep.TOP)


solid = Compound([body_2.part, part_1.part])
